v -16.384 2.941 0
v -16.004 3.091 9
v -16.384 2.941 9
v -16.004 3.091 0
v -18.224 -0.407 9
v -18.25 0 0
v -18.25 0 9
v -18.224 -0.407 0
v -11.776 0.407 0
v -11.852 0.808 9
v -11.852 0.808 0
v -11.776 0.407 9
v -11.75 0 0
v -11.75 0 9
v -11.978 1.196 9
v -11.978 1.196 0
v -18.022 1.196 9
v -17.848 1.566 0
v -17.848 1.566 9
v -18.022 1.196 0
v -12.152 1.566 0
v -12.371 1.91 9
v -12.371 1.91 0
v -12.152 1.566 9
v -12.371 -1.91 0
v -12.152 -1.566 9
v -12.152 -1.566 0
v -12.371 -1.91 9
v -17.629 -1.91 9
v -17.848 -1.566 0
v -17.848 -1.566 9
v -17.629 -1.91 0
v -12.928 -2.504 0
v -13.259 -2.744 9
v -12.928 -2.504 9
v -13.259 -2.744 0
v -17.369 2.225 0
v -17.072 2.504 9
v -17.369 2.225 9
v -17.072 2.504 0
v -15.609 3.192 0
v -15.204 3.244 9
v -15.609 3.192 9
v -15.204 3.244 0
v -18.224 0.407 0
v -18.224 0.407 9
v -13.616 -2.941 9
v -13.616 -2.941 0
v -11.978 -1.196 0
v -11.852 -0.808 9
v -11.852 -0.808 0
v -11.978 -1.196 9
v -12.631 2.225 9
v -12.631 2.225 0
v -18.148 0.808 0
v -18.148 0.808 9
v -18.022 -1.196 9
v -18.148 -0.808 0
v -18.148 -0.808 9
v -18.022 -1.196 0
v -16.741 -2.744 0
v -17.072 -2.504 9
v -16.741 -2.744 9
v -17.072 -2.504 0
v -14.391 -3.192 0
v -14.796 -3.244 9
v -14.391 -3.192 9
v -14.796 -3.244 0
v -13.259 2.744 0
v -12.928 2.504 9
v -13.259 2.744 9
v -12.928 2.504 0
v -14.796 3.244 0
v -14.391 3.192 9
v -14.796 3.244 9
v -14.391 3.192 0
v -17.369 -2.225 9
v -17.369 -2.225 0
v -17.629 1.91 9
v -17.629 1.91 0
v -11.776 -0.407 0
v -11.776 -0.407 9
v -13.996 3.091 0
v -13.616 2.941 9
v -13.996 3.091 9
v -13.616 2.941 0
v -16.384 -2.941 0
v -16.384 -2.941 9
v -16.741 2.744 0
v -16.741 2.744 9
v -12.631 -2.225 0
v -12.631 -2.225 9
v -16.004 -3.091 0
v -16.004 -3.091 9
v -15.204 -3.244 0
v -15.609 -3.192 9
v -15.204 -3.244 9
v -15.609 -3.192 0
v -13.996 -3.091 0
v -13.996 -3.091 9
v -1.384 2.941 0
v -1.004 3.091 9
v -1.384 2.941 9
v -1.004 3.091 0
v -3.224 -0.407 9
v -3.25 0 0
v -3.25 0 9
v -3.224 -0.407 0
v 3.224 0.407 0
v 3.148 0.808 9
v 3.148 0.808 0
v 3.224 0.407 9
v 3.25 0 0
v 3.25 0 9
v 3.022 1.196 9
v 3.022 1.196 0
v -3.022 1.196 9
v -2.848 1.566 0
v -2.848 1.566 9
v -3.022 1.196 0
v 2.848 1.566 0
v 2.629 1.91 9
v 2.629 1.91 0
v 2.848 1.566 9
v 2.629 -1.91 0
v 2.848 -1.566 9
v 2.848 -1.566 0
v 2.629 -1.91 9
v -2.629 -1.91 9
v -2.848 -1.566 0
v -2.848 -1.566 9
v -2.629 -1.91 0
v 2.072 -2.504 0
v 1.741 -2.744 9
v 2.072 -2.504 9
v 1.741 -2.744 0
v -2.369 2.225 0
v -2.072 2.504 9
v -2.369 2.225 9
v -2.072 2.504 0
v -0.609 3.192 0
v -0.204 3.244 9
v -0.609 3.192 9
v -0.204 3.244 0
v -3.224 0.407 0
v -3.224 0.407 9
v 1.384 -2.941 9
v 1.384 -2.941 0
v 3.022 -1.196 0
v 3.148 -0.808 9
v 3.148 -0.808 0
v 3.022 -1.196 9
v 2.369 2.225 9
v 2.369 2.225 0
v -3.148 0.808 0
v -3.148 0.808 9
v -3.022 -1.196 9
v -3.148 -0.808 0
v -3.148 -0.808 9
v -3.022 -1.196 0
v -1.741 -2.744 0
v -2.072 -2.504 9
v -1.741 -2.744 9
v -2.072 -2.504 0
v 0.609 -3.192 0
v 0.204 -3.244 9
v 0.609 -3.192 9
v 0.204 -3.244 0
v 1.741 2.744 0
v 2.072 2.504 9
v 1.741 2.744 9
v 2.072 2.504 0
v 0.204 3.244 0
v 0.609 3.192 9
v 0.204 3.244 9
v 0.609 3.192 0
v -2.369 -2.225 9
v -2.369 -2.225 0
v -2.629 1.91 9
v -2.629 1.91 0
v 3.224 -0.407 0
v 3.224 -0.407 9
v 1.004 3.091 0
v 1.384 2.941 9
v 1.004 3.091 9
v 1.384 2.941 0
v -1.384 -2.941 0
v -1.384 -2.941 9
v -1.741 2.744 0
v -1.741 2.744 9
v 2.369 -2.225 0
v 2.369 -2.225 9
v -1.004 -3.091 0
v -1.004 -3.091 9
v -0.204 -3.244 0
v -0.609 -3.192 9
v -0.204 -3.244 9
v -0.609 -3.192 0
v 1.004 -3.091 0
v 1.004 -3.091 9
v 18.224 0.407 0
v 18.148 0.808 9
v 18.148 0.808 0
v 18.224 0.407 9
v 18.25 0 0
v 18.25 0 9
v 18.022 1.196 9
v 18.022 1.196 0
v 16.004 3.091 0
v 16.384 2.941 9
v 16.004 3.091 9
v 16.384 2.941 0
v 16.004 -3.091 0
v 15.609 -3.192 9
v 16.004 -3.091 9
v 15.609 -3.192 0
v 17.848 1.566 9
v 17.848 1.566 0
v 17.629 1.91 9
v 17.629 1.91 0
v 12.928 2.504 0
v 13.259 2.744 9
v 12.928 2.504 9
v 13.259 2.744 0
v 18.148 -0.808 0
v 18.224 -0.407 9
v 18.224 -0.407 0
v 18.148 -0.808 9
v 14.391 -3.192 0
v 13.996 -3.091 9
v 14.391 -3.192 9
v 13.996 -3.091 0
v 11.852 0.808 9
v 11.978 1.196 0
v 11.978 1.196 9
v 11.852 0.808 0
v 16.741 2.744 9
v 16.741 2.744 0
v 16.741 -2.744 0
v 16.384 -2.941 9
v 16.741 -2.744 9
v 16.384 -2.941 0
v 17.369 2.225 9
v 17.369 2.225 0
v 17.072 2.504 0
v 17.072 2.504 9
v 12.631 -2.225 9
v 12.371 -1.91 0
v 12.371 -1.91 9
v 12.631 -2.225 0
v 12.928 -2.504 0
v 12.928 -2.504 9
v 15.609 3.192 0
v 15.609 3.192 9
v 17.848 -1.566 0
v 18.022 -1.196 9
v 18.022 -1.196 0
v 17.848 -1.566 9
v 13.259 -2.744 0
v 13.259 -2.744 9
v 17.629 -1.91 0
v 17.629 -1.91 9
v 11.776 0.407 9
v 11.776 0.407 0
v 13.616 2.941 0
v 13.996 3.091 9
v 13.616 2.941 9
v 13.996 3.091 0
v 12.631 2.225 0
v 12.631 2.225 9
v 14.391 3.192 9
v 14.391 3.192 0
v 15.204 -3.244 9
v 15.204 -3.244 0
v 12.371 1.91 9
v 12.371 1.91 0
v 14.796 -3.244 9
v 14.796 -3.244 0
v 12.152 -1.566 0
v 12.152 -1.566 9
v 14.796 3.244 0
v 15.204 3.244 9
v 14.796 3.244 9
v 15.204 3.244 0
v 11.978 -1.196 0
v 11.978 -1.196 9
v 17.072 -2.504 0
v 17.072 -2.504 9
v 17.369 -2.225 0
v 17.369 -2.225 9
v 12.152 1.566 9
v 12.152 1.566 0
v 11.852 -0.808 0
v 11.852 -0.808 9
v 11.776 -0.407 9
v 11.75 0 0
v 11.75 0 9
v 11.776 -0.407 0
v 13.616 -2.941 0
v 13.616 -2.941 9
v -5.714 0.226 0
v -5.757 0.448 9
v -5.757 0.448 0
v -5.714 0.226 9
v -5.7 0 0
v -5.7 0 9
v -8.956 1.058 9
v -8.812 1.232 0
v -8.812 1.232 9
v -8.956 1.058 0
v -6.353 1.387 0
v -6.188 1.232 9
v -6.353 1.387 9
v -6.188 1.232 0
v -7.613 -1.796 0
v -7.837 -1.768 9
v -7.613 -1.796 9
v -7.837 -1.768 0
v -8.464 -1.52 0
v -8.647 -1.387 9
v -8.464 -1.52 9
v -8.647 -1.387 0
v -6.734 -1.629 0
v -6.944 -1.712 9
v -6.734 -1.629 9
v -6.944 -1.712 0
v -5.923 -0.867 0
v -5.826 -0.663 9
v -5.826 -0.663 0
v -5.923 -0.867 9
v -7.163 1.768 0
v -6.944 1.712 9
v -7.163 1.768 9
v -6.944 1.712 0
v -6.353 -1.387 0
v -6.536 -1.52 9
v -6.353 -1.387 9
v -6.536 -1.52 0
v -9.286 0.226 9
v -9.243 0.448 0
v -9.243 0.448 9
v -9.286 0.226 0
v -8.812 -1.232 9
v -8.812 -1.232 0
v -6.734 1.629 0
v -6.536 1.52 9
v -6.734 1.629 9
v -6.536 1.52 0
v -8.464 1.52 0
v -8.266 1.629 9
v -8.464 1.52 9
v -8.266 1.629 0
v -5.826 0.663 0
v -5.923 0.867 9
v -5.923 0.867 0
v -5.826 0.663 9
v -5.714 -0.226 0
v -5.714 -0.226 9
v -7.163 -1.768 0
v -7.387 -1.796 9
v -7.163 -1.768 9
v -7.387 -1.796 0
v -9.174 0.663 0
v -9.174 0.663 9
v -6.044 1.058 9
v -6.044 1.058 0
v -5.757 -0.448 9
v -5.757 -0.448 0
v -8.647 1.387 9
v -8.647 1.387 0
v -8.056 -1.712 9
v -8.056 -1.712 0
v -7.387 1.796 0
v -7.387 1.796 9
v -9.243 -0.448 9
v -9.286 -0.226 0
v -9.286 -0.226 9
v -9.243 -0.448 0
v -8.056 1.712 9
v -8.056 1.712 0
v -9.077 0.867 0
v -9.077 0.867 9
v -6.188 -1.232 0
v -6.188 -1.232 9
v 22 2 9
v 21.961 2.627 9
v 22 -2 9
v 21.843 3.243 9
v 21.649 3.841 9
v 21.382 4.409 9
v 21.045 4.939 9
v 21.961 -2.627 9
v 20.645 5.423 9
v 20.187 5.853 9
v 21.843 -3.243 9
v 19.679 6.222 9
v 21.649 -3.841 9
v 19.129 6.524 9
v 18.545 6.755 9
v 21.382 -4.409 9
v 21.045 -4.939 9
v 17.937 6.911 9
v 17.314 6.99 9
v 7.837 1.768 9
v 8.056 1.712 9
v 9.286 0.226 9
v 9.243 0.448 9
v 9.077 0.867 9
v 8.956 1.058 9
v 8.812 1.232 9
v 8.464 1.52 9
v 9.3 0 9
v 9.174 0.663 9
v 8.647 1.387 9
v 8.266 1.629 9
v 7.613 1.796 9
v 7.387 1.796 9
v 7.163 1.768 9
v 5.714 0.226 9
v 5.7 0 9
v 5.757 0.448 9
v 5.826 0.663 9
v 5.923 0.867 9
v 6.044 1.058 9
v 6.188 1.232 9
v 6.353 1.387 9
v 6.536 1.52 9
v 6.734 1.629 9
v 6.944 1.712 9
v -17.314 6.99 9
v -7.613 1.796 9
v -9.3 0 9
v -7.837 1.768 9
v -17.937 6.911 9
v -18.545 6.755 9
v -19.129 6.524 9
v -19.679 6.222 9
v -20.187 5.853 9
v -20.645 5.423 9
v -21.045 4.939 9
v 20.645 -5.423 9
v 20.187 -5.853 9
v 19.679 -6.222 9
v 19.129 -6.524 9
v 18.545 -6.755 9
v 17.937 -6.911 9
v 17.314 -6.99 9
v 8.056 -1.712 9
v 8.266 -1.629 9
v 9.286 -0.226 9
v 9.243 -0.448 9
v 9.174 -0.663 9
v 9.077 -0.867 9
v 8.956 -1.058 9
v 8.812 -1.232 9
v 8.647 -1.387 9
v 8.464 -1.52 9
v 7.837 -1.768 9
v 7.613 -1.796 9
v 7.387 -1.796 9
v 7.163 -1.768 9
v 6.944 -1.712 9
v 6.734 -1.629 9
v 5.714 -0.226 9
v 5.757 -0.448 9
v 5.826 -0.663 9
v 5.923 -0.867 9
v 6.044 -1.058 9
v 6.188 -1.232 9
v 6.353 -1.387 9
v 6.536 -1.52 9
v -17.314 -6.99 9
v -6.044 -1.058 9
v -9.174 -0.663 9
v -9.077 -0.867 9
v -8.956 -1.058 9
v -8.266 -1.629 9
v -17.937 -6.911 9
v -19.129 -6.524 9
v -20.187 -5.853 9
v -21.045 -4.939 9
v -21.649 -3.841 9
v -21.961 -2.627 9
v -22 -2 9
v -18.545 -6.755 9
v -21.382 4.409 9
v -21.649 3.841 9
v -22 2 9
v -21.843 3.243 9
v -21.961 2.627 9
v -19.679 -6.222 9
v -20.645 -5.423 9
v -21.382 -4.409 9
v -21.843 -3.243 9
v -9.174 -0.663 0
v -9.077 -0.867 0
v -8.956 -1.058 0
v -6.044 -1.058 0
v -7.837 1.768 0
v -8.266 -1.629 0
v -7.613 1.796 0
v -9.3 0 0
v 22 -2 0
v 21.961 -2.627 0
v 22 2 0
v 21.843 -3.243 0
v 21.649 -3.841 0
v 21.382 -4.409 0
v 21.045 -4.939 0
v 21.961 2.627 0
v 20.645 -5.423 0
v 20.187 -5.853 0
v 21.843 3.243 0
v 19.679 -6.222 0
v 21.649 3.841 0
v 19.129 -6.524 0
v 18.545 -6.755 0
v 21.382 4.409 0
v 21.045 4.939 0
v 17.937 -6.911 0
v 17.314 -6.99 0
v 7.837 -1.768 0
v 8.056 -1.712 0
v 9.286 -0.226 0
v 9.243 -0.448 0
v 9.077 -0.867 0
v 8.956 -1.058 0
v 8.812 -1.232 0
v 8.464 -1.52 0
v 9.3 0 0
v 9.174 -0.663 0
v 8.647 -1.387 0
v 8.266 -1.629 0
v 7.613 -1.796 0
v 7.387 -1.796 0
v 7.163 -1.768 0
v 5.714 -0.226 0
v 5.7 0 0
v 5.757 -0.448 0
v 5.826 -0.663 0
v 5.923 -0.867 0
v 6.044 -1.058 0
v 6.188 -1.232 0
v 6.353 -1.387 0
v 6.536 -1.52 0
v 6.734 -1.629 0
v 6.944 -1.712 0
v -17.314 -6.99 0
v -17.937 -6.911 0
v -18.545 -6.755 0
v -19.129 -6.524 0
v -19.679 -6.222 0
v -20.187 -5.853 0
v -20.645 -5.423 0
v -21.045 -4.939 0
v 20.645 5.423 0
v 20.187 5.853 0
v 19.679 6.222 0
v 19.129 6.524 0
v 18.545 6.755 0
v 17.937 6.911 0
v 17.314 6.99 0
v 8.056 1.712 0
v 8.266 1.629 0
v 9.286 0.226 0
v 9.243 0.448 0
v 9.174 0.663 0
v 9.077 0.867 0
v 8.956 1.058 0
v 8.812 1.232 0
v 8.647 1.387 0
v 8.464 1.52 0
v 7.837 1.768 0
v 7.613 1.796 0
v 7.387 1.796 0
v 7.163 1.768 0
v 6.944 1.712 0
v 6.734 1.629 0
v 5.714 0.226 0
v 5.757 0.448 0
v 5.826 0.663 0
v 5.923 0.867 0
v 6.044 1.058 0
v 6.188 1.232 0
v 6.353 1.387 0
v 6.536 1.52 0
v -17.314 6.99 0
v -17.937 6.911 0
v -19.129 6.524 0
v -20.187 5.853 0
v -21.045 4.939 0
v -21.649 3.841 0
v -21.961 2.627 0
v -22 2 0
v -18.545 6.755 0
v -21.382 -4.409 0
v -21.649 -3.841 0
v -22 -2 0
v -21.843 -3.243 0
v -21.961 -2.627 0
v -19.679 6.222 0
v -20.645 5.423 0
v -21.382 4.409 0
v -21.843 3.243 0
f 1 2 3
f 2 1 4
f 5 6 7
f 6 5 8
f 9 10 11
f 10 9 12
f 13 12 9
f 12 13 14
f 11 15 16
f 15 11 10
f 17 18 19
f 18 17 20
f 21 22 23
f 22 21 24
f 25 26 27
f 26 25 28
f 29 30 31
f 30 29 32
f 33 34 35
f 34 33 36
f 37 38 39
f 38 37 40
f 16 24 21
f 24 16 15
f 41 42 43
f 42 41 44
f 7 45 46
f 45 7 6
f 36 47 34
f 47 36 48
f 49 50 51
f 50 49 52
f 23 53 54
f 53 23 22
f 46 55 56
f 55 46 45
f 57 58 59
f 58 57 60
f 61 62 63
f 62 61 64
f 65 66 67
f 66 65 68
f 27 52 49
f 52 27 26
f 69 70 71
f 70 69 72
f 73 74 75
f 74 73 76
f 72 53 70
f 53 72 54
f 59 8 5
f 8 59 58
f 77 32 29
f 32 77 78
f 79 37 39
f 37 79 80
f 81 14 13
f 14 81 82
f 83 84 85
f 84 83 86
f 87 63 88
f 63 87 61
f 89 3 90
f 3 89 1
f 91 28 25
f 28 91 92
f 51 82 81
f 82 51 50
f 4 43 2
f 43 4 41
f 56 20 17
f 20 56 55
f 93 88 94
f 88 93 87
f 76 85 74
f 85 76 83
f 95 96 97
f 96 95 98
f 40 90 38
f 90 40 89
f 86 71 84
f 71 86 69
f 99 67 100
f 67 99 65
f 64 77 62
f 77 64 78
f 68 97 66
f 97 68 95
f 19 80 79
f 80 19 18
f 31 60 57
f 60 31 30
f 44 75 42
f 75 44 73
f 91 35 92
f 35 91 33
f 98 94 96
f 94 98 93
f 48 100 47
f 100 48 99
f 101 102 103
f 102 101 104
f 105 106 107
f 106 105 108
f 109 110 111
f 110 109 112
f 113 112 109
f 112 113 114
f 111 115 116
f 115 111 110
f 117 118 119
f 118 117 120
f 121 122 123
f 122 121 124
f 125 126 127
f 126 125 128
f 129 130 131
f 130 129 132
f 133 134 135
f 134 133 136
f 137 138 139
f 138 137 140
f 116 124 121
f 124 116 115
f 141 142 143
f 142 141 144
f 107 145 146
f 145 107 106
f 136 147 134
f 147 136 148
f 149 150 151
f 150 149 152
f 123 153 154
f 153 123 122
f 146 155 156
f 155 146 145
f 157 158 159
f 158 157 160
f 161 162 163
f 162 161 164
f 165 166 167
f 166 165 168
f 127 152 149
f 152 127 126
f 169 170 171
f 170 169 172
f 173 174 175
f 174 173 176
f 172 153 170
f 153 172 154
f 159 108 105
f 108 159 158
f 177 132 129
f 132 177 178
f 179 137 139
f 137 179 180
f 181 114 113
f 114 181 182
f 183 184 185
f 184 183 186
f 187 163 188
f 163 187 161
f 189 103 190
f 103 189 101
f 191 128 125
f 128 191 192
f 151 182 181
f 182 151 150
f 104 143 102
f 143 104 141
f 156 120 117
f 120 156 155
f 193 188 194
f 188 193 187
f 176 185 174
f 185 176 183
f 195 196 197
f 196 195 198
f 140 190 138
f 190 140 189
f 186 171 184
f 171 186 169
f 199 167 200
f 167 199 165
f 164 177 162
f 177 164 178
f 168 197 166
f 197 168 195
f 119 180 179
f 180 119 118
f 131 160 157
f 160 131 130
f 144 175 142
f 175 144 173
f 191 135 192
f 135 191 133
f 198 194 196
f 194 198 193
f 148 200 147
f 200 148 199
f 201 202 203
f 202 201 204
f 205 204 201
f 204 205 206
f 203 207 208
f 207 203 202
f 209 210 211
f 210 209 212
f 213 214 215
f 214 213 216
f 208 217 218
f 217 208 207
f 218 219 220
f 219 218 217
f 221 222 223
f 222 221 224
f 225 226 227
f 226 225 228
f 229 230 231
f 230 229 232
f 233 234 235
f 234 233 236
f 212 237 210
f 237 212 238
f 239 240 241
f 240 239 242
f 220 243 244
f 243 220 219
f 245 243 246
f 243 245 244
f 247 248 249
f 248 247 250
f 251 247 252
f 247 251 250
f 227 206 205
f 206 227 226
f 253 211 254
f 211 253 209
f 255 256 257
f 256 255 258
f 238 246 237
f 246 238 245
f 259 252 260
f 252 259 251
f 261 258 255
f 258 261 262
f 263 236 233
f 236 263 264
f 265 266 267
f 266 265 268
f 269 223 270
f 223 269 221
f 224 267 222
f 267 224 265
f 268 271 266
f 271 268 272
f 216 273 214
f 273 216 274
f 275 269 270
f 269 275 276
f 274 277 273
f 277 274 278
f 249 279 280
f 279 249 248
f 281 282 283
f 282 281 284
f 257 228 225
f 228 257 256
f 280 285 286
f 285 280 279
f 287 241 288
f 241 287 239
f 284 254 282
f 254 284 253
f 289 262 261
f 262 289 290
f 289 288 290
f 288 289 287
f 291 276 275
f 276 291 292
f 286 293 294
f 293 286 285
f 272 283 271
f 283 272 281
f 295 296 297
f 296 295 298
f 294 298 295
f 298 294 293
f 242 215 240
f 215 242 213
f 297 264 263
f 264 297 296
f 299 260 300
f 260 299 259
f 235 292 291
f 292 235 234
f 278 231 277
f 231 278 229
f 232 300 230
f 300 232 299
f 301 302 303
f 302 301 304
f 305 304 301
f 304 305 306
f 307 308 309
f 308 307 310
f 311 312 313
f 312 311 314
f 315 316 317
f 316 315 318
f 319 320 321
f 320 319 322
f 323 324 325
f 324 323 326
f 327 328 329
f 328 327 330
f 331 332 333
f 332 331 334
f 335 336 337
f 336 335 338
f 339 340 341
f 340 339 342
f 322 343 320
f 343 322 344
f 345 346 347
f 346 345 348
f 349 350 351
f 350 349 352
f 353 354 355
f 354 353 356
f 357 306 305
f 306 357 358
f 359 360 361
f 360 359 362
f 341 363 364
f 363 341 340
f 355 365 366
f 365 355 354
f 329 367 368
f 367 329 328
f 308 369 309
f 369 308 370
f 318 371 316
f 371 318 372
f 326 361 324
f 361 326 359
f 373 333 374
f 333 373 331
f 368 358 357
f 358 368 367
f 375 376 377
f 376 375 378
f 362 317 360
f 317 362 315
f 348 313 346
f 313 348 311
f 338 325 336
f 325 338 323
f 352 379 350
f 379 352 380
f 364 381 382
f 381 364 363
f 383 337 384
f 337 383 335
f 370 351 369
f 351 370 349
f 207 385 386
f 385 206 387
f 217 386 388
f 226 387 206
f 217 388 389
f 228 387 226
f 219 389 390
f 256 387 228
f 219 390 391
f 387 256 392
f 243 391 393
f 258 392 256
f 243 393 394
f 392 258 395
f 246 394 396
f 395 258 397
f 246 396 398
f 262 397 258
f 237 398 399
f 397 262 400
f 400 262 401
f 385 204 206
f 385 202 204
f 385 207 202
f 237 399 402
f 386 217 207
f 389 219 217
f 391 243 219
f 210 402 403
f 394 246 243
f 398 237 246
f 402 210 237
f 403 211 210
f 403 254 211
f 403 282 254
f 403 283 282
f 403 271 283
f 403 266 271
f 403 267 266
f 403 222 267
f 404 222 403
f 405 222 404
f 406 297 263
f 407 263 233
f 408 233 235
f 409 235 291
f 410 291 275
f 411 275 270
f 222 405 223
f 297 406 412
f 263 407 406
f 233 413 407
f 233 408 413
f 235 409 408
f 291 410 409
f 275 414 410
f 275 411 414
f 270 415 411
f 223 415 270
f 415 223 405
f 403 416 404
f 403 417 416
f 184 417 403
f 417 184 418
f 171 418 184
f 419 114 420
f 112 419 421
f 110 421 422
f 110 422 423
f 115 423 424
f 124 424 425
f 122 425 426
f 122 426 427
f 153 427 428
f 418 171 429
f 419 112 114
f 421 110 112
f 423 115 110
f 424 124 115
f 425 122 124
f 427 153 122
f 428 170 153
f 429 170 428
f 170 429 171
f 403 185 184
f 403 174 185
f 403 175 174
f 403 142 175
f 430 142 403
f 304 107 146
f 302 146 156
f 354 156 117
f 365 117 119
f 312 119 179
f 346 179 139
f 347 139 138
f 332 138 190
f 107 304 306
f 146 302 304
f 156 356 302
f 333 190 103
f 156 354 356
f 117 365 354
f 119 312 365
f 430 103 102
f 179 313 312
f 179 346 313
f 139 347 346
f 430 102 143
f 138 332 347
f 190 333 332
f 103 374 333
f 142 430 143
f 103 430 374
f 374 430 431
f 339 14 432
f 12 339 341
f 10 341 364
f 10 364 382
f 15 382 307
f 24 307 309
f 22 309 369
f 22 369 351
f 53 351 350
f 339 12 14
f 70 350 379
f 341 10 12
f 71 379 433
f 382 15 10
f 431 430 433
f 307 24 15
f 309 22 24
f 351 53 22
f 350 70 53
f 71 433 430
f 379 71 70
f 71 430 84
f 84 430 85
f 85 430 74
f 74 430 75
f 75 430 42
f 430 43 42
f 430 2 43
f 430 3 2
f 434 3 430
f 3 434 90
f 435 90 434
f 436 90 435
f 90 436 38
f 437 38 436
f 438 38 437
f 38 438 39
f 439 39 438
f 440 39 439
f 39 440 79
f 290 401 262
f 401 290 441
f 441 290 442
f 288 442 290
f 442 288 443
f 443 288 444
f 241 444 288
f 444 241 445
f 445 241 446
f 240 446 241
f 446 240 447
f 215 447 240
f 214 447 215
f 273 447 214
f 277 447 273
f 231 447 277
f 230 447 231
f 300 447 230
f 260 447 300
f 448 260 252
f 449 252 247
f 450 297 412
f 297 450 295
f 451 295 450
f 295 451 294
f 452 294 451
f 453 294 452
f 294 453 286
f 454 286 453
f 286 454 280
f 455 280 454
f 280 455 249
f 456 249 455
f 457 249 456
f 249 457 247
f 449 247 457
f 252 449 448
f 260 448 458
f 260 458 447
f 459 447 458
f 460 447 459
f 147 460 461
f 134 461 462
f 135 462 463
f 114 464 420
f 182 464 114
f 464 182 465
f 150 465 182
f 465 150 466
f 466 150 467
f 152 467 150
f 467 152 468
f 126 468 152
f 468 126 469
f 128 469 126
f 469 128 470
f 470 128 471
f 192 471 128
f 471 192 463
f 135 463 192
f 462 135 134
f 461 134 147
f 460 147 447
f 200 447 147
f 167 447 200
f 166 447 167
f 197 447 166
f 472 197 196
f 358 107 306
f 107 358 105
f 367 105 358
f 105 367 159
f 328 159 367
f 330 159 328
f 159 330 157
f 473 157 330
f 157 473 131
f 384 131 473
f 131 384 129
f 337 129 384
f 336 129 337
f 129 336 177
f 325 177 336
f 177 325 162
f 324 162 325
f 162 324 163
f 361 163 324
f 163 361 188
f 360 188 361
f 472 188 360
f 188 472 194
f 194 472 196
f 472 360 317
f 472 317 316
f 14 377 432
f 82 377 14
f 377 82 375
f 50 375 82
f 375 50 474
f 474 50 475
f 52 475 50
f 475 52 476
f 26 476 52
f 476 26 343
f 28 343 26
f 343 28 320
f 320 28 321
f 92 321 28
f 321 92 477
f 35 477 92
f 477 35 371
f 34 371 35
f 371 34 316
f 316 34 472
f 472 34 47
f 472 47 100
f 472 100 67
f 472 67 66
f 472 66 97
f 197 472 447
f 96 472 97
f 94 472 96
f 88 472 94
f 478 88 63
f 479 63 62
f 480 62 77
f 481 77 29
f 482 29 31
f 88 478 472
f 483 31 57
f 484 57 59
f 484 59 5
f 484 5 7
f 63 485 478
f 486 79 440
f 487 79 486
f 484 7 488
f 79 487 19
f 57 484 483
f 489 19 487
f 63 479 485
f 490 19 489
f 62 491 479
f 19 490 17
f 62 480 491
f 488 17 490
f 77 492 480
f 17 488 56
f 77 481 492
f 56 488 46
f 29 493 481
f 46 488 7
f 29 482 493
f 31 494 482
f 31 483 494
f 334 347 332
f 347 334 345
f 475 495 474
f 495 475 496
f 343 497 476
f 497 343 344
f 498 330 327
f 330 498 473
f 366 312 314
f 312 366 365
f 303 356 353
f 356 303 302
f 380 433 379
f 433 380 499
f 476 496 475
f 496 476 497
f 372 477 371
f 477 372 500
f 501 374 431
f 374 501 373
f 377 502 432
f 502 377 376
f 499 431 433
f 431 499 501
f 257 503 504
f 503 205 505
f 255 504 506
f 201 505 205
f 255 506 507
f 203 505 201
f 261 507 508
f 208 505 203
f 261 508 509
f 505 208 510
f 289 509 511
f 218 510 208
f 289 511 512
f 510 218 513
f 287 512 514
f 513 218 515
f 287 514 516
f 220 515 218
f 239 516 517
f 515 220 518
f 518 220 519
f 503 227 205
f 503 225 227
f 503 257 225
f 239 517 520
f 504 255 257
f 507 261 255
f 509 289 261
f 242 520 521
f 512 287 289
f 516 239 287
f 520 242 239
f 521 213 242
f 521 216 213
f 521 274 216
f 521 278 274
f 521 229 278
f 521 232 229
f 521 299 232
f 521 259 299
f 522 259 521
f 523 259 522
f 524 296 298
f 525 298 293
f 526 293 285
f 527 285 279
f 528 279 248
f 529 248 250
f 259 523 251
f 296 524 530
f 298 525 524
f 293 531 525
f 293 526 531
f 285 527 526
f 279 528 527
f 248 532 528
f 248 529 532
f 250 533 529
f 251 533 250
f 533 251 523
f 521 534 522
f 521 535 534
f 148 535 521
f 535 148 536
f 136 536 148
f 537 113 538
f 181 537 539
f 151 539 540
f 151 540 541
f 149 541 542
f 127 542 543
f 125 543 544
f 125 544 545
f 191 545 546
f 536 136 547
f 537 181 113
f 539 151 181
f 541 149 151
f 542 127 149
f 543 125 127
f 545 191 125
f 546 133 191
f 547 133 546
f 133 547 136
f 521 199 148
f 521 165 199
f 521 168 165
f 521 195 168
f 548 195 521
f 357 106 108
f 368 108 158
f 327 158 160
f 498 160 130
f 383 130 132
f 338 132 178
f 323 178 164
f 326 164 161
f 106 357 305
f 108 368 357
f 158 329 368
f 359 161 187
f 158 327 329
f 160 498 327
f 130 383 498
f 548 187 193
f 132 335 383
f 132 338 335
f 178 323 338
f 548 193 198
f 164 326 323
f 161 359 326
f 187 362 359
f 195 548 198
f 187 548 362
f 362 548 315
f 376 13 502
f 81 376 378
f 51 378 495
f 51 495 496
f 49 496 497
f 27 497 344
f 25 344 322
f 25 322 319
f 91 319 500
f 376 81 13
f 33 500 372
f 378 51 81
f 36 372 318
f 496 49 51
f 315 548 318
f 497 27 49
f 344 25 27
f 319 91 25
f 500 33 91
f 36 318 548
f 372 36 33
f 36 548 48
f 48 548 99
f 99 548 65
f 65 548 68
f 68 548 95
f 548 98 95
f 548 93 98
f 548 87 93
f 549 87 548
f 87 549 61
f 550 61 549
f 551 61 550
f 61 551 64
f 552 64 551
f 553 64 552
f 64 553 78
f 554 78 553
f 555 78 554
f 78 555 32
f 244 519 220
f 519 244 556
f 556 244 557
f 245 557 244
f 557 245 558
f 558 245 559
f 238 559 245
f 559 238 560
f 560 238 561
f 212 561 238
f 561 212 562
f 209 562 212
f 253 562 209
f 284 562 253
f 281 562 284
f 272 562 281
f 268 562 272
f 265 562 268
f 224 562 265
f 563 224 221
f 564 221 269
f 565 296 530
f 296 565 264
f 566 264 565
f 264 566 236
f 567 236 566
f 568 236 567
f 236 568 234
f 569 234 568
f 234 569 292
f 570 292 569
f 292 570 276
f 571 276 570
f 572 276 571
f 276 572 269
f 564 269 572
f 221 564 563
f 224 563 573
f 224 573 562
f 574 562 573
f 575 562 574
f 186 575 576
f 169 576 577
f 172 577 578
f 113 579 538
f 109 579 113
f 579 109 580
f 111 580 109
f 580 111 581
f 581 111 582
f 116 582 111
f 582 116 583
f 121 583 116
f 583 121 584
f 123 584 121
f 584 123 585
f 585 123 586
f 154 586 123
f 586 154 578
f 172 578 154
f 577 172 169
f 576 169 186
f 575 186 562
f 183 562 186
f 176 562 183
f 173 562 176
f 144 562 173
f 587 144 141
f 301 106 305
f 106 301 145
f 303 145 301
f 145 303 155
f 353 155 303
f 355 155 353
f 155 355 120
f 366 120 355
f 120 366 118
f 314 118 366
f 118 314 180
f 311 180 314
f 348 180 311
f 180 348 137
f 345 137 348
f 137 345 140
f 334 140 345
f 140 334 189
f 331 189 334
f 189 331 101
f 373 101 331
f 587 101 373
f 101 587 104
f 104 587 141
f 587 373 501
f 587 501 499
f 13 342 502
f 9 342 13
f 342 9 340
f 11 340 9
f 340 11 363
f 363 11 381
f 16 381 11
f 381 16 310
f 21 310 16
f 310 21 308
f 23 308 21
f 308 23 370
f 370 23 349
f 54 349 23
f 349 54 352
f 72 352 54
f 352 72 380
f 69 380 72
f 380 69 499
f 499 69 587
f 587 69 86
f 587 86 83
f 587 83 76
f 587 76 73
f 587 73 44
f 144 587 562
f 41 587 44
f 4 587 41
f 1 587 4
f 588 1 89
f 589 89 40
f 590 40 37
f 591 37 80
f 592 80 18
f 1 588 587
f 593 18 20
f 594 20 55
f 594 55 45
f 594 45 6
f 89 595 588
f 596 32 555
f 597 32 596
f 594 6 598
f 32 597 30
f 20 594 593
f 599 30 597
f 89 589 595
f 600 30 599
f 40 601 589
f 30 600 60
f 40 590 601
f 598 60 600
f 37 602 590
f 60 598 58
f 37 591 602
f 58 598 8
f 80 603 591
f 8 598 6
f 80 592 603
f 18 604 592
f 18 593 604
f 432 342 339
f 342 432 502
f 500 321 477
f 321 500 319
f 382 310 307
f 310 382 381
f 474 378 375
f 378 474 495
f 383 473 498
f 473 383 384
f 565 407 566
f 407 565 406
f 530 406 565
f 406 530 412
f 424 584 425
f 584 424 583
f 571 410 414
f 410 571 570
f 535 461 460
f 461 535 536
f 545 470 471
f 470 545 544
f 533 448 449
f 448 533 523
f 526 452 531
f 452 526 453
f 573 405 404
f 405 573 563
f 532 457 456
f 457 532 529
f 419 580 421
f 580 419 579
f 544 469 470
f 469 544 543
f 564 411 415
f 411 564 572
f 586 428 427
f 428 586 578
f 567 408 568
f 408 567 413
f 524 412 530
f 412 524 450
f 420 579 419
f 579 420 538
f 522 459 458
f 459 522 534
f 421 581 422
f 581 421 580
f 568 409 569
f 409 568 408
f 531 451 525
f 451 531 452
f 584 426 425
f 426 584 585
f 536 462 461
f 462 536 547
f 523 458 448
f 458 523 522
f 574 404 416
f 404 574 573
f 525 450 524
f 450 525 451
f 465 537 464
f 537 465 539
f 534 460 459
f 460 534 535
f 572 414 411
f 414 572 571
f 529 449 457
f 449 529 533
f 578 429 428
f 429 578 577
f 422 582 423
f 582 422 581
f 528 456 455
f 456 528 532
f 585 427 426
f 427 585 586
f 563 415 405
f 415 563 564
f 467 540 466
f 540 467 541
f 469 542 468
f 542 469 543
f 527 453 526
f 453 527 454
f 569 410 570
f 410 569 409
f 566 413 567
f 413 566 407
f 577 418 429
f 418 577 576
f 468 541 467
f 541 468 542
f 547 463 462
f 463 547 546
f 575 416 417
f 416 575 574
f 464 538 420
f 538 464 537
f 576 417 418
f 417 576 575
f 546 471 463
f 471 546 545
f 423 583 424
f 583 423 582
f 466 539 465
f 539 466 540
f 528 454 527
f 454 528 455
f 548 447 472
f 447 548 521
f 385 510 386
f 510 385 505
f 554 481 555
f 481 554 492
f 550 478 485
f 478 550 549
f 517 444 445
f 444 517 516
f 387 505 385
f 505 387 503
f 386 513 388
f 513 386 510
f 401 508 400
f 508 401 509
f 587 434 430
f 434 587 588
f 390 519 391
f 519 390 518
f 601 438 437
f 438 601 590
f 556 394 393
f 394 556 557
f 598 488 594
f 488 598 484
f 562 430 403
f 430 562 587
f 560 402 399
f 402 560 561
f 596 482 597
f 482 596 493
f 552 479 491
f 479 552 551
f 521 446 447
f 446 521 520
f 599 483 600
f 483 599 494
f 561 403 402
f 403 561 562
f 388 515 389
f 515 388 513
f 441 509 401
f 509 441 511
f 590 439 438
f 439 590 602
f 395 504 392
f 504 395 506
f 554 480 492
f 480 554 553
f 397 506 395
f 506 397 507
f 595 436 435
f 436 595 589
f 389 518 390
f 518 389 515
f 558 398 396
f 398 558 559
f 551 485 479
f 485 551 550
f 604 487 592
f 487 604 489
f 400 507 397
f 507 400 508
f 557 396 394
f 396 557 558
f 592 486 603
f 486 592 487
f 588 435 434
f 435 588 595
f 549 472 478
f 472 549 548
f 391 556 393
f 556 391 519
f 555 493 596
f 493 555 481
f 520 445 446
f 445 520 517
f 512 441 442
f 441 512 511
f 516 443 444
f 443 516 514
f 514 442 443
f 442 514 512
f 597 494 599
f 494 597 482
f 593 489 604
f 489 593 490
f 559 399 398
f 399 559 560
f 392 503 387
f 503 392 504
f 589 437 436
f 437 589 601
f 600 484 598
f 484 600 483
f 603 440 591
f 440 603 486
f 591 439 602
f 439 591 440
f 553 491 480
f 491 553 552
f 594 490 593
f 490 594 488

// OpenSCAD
$fn = 50;


difference() {
	union() {
		hull() {
			translate(v = [-17.0000000000, 2.0000000000, 0]) {
				cylinder(h = 9, r = 5);
			}
			translate(v = [17.0000000000, 2.0000000000, 0]) {
				cylinder(h = 9, r = 5);
			}
			translate(v = [-17.0000000000, -2.0000000000, 0]) {
				cylinder(h = 9, r = 5);
			}
			translate(v = [17.0000000000, -2.0000000000, 0]) {
				cylinder(h = 9, r = 5);
			}
		}
	}
	union() {
		translate(v = [-15.0000000000, 0.0000000000, -100.0000000000]) {
			cylinder(h = 200, r = 3.2500000000);
		}
		translate(v = [0.0000000000, 0.0000000000, -100.0000000000]) {
			cylinder(h = 200, r = 3.2500000000);
		}
		translate(v = [15.0000000000, 0.0000000000, -100.0000000000]) {
			cylinder(h = 200, r = 3.2500000000);
		}
		translate(v = [-15.0000000000, 0.0000000000, 0]) {
			cylinder(h = 9, r = 1.8000000000);
		}
		translate(v = [-7.5000000000, 0.0000000000, 0]) {
			cylinder(h = 9, r = 1.8000000000);
		}
		cylinder(h = 9, r = 1.8000000000);
		translate(v = [7.5000000000, 0.0000000000, 0]) {
			cylinder(h = 9, r = 1.8000000000);
		}
		translate(v = [15.0000000000, 0.0000000000, 0]) {
			cylinder(h = 9, r = 1.8000000000);
		}
		translate(v = [-15.0000000000, 0.0000000000, 0]) {
			cylinder(h = 9, r = 1.8000000000);
		}
		translate(v = [-7.5000000000, 0.0000000000, 0]) {
			cylinder(h = 9, r = 1.8000000000);
		}
		cylinder(h = 9, r = 1.8000000000);
		translate(v = [7.5000000000, 0.0000000000, 0]) {
			cylinder(h = 9, r = 1.8000000000);
		}
		translate(v = [15.0000000000, 0.0000000000, 0]) {
			cylinder(h = 9, r = 1.8000000000);
		}
		translate(v = [-15.0000000000, 0.0000000000, 0]) {
			cylinder(h = 9, r = 1.8000000000);
		}
		translate(v = [-7.5000000000, 0.0000000000, 0]) {
			cylinder(h = 9, r = 1.8000000000);
		}
		cylinder(h = 9, r = 1.8000000000);
		translate(v = [7.5000000000, 0.0000000000, 0]) {
			cylinder(h = 9, r = 1.8000000000);
		}
		translate(v = [15.0000000000, 0.0000000000, 0]) {
			cylinder(h = 9, r = 1.8000000000);
		}
	}
}
